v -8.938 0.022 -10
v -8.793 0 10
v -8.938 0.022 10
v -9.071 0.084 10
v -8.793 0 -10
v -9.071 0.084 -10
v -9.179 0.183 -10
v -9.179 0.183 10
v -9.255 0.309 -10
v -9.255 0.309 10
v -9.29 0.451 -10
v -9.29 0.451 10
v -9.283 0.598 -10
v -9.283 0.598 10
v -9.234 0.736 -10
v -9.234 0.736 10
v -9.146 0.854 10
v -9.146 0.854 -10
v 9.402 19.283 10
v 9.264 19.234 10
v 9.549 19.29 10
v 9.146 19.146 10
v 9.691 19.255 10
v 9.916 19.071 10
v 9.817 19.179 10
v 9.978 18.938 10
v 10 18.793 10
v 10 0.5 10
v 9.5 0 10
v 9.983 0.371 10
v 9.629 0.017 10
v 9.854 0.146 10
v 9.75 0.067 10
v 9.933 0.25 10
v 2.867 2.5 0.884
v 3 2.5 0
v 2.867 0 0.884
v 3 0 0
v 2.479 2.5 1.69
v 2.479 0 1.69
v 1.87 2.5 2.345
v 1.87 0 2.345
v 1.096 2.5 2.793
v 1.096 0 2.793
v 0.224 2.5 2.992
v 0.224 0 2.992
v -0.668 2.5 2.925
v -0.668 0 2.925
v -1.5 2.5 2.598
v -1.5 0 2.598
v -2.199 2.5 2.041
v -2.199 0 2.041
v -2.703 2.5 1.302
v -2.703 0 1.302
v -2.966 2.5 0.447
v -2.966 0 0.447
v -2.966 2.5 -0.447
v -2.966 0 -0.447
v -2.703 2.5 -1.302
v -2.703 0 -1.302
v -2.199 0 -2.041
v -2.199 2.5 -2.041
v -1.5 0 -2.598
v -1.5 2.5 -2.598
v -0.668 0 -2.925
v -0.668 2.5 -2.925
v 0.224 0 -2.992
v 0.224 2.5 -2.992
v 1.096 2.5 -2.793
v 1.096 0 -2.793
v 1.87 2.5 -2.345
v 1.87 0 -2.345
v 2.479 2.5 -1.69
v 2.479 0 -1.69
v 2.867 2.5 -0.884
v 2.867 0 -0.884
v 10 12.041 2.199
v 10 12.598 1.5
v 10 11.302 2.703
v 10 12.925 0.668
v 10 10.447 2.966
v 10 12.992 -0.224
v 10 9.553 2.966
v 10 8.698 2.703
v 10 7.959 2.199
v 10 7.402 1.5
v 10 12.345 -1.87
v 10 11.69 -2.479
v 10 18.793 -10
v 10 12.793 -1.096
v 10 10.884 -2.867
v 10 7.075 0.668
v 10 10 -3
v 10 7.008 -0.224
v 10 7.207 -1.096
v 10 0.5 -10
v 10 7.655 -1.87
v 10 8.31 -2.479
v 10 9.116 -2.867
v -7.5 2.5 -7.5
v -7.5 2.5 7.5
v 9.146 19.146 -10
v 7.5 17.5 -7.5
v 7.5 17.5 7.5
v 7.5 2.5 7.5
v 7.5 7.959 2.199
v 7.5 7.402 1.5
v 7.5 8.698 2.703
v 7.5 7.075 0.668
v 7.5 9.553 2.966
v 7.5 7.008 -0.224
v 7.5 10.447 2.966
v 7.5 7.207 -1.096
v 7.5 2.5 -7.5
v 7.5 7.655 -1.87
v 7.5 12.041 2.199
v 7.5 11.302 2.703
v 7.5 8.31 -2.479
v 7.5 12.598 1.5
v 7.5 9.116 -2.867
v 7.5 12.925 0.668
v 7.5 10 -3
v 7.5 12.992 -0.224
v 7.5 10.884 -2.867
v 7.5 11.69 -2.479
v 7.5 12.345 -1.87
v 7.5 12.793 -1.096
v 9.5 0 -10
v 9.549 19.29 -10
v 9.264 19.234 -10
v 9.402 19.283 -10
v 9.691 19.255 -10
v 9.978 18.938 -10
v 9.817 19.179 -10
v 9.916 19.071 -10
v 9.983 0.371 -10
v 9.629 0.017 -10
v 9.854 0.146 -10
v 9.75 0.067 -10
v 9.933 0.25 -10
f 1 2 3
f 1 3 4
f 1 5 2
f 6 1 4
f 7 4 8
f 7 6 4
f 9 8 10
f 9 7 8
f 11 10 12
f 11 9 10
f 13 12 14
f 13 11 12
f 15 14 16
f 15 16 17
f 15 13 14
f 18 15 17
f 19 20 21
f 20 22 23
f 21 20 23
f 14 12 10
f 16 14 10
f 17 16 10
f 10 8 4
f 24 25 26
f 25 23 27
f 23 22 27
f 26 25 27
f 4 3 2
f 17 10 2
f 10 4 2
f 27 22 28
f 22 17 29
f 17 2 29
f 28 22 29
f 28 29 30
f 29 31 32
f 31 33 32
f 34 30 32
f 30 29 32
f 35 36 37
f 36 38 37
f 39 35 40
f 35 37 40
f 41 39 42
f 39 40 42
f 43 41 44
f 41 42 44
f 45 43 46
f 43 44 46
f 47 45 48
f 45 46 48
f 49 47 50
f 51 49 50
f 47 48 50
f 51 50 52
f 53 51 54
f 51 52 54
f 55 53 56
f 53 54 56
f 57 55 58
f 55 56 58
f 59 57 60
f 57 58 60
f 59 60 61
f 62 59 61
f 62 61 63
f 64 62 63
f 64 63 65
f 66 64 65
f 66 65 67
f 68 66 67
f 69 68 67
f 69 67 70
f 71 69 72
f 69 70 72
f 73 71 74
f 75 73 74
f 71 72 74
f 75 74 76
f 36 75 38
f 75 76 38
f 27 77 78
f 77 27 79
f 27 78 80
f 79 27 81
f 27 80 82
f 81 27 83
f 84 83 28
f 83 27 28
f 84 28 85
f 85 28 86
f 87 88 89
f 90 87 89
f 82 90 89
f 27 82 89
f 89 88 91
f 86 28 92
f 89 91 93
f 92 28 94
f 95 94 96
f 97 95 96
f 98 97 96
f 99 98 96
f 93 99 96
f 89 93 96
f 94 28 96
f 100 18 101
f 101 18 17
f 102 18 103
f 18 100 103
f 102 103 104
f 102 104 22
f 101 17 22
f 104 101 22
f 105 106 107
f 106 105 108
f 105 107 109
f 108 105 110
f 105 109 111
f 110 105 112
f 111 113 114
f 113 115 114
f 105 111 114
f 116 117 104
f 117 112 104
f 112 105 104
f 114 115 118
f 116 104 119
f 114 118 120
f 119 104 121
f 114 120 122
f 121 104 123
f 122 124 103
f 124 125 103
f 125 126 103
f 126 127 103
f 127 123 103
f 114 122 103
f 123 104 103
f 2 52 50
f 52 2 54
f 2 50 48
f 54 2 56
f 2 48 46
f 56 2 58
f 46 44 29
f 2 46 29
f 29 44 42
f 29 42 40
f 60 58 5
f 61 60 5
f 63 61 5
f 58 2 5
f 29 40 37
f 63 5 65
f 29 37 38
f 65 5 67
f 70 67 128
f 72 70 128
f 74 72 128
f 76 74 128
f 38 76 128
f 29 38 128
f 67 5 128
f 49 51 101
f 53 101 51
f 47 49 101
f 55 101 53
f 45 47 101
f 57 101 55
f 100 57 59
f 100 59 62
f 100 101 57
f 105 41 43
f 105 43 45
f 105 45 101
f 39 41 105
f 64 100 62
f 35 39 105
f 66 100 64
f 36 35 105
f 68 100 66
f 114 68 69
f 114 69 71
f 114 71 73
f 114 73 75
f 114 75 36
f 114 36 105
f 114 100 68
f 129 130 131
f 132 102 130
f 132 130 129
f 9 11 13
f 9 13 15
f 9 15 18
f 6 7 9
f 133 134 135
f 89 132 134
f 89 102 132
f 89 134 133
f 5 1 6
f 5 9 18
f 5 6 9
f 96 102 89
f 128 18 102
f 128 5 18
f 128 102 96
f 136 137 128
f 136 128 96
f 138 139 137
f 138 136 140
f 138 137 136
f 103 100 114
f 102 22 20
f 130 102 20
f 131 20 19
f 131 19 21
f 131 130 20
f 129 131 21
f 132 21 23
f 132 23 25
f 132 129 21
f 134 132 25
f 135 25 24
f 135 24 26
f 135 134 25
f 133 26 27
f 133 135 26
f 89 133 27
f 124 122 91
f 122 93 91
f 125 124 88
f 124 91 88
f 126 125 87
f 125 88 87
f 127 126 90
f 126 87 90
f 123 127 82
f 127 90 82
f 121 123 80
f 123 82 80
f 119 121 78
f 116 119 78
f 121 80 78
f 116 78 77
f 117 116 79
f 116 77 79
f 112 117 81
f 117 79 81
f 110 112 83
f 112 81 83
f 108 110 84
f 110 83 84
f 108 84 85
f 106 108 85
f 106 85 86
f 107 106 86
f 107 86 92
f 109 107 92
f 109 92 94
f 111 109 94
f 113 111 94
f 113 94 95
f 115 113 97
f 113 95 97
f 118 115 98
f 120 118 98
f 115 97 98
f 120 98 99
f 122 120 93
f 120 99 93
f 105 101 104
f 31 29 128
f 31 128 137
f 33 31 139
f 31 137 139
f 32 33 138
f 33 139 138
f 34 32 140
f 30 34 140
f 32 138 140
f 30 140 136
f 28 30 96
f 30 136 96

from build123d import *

# Parameters (mm, degrees)
SKETCH1_W               = 20
SKETCH1_H               = 20
BOSS_EXTRUDE1_DEPTH     = 20
CUT_EXTRUDE1_DEPTH      = 1
CUT_EXTRUDE1_DEPTH_BACK = 21
SKETCH3_R               = 3
CUT_EXTRUDE2_DEPTH      = 21
SKETCH4_R               = 3
CUT_EXTRUDE3_DEPTH      = 21
SKETCH5_W               = 15
SKETCH5_H               = 15
CUT_EXTRUDE5_DEPTH      = 17.5
FILLET1_R               = 0.5


with BuildPart() as part:
    # Sketch1 → Boss-Extrude1 (new body)
    with BuildSketch(Plane(origin=(0, 0, 0), x_dir=(1, 0, 0), z_dir=(0, 1, 0))):
        Rectangle(SKETCH1_W, SKETCH1_H)
    extrude(amount=BOSS_EXTRUDE1_DEPTH)

    # Sketch2 → Cut-Extrude1 (cut, two sides)
    with BuildSketch(Plane.XY.offset(10)) as cut_extrude1_sk:
        Polygon((-10, 0), (10, 20), (-10, 20), align=None)
    extrude(amount=CUT_EXTRUDE1_DEPTH, mode=Mode.SUBTRACT)
    extrude(cut_extrude1_sk.sketch, amount=-CUT_EXTRUDE1_DEPTH_BACK, mode=Mode.SUBTRACT)

    # Sketch3 → Cut-Extrude2 (cut, through all)
    with BuildSketch(Plane(origin=(10, 0, 0), x_dir=(0, 0, -1), z_dir=(1, 0, 0))):
        with Locations((0, 10)):
            Circle(SKETCH3_R)
    extrude(amount=-CUT_EXTRUDE2_DEPTH, mode=Mode.SUBTRACT)

    # Sketch4 → Cut-Extrude3 (cut, through all)
    with BuildSketch(Plane.XZ):
        Circle(SKETCH4_R)
    extrude(amount=-CUT_EXTRUDE3_DEPTH, mode=Mode.SUBTRACT)

    # Sketch5 → Cut-Extrude5 (cut)
    with BuildSketch(Plane(origin=(0, 20, 0), x_dir=(1, 0, 0), z_dir=(0, 1, 0))):
        Rectangle(SKETCH5_W, SKETCH5_H)
    extrude(amount=-CUT_EXTRUDE5_DEPTH, mode=Mode.SUBTRACT)

    # Fillet1
    fillet1_edges = [part.edges().sort_by_distance(p)[0] for p in [
        (10, 20, 0),
        (-10, 0, 0),
        (10, 0, 0),
    ]]
    fillet(fillet1_edges, radius=FILLET1_R)


solid = part.part
